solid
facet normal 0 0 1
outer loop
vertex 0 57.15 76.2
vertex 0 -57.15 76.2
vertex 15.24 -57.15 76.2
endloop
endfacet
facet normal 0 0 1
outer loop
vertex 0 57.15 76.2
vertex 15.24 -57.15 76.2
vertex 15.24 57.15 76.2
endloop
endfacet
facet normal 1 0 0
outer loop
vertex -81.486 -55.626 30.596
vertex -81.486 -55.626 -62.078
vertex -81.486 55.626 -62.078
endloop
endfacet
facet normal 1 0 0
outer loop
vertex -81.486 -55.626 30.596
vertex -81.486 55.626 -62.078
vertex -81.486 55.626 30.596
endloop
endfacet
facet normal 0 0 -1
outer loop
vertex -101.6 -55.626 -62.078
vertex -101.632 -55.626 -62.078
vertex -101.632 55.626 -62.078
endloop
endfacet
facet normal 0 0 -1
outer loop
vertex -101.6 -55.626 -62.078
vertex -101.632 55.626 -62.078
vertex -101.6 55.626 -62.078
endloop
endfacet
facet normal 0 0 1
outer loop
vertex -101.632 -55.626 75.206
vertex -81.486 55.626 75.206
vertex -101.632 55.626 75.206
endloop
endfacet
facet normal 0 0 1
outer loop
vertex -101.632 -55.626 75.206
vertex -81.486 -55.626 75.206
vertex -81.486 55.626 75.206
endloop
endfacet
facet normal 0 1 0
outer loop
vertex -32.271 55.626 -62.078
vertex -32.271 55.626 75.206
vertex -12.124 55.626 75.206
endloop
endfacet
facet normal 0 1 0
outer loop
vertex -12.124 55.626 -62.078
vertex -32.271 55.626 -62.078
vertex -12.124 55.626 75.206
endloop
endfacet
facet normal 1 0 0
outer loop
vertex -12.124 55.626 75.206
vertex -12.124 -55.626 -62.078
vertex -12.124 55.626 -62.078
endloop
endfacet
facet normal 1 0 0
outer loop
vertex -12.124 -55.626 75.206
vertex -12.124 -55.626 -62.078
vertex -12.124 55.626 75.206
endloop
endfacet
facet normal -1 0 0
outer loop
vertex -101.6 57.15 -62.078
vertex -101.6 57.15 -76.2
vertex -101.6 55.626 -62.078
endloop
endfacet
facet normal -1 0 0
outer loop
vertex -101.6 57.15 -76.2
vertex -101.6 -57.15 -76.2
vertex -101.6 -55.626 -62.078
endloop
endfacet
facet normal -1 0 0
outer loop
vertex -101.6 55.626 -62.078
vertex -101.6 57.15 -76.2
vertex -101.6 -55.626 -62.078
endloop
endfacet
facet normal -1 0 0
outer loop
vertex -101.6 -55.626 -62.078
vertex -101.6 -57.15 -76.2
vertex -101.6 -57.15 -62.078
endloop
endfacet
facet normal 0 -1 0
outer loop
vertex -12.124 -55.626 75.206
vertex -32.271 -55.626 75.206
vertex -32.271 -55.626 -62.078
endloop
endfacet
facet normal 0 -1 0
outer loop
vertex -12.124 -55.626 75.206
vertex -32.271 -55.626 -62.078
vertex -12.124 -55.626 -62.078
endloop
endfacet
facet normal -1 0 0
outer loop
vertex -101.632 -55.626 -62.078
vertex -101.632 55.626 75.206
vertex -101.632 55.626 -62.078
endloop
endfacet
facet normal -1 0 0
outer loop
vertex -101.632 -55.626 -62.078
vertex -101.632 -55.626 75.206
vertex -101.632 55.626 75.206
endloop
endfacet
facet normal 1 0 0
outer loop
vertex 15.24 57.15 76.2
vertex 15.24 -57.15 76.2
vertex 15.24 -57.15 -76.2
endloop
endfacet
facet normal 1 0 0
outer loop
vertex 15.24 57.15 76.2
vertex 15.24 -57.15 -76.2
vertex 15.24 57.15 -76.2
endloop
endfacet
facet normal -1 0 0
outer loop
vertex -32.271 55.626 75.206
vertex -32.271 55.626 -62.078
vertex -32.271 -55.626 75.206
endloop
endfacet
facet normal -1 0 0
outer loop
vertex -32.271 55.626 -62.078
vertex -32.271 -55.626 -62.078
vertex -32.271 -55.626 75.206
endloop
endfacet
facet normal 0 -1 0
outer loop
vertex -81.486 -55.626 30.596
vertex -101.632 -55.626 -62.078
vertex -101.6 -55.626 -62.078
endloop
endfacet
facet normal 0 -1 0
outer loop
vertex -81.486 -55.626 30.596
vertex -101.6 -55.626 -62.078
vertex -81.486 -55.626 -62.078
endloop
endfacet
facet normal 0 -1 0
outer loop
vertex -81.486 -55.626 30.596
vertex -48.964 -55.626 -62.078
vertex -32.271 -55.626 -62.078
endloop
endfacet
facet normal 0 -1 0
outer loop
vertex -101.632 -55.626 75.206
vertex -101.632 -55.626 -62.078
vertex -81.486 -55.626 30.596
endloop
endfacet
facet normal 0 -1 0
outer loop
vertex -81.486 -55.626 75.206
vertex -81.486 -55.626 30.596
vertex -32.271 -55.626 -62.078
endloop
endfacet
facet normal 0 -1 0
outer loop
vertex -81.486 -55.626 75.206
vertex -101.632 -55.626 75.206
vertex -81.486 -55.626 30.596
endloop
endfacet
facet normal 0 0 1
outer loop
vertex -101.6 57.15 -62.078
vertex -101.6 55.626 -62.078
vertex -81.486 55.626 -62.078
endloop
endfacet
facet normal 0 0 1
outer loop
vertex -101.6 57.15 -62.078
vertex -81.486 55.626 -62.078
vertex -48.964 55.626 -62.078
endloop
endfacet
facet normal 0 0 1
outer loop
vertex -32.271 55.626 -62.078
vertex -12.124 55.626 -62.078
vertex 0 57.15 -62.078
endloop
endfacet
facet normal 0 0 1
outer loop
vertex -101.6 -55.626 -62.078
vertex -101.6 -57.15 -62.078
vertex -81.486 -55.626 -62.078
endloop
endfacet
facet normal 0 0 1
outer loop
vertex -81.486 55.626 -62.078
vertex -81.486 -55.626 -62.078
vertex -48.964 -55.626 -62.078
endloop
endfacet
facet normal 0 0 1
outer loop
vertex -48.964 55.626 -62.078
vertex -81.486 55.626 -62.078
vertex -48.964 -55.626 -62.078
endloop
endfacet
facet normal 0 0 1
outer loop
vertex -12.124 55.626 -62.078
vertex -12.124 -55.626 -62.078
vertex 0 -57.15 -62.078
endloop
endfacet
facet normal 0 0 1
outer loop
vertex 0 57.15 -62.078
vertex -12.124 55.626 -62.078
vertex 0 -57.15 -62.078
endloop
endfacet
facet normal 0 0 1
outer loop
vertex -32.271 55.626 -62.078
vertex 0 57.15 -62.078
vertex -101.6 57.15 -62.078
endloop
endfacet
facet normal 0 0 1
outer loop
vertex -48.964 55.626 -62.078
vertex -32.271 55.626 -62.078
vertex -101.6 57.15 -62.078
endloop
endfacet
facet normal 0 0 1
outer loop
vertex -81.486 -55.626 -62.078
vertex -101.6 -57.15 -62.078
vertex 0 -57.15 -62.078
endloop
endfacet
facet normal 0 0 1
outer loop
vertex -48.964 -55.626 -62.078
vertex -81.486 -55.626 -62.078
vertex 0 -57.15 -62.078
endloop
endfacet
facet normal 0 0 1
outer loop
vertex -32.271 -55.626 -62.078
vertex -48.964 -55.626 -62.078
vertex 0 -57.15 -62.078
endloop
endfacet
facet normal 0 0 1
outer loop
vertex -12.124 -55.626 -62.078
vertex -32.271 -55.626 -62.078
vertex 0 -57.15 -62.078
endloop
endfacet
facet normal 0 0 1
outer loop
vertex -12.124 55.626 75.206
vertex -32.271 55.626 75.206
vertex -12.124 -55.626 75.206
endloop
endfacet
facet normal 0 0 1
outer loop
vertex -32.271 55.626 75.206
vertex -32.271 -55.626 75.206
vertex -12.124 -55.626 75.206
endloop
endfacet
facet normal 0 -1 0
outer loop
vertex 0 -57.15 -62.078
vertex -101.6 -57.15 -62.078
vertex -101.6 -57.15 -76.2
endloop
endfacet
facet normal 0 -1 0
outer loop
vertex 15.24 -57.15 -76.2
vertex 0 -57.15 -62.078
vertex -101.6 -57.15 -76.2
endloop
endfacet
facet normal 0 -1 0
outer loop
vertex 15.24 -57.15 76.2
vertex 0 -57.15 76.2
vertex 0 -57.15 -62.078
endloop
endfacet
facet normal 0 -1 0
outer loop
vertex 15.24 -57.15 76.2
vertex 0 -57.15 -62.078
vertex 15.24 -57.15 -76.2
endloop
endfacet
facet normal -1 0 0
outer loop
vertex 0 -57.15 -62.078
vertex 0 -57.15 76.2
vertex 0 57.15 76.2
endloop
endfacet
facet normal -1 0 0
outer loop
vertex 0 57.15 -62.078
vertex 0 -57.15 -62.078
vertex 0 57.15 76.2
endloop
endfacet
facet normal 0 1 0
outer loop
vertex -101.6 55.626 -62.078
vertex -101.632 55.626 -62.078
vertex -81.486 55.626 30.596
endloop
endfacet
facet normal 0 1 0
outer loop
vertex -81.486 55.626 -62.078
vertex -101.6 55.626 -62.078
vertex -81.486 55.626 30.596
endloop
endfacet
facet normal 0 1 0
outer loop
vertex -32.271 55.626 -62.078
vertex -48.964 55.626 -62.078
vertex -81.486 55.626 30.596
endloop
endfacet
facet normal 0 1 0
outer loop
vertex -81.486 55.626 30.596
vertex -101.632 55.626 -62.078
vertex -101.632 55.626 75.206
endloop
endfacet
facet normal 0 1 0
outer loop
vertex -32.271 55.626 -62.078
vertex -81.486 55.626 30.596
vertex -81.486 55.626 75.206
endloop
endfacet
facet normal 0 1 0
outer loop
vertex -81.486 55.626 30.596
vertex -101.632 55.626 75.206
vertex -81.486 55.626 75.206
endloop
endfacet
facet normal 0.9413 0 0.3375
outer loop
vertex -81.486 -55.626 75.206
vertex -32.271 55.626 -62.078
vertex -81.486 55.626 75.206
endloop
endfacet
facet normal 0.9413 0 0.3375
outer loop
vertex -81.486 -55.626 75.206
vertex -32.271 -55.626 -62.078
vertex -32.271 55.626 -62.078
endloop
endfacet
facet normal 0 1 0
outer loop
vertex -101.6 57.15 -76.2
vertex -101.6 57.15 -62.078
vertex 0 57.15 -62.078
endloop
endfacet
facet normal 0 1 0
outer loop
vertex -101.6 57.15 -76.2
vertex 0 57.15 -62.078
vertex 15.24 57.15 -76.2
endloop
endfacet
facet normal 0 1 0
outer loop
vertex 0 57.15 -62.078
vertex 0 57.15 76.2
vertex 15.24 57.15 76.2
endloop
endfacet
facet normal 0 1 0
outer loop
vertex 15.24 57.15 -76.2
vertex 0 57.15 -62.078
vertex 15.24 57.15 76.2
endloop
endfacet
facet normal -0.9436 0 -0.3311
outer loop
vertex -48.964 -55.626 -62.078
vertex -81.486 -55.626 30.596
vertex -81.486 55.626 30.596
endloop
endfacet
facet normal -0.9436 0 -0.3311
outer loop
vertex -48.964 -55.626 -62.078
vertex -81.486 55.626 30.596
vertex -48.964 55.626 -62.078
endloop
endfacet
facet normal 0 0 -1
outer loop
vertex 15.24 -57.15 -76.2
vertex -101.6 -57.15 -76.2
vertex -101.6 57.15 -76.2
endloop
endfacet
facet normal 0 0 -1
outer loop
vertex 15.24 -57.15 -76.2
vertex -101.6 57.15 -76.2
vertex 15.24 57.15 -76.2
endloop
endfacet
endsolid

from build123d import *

# Parameters (mm, degrees)
F0_W     = 114.3
F0_H     = 152.4
F1_DEPTH = 15.24
F2_W     = 101.6
F2_H     = 14.1224
F3_DEPTH = 57.15
F4_DEPTH = 57.15
F5_W     = 20.146407
F5_H     = 137.283351
F6_DEPTH = 55.626
F7_DEPTH = 55.626


with BuildPart() as f1:
    # F0 (on Right) → F1 (new body)
    with BuildSketch(Plane.YZ):
        Rectangle(F0_W, F0_H)
    extrude(amount=F1_DEPTH)

    # F2 (on Front) → F3 (join)
    with BuildSketch(Plane.XZ):
        with Locations((-50.8, -69.1388)):
            Rectangle(F2_W, F2_H)
    extrude(amount=F3_DEPTH)

    # F2 (on Front) → F4 (join)
    with BuildSketch(Plane.XZ):
        with Locations((-50.8, -69.1388)):
            Rectangle(F2_W, F2_H)
    extrude(amount=-F4_DEPTH)

    # F5 (on Front) → F6 (join)
    with BuildSketch(Plane.XZ):
        Polygon((-101.631984, 75.205751), (-101.631984, -62.0776), (-81.485577, -62.0776), (-81.485577, 30.595854), (-81.485577, 75.205751), align=None)
        with Locations((-22.197589, 6.564075)):
            Rectangle(F5_W, F5_H)
        Polygon((-81.485577, 75.205751), (-81.485577, 30.595854), (-48.963528, -62.0776), (-32.270793, -62.0776), align=None)
    extrude(amount=F6_DEPTH)

    # F5 (on Front) → F7 (join)
    with BuildSketch(Plane.XZ):
        Polygon((-101.631984, 75.205751), (-101.631984, -62.0776), (-81.485577, -62.0776), (-81.485577, 30.595854), (-81.485577, 75.205751), align=None)
        with Locations((-22.197589, 6.564075)):
            Rectangle(F5_W, F5_H)
        Polygon((-81.485577, 75.205751), (-81.485577, 30.595854), (-48.963528, -62.0776), (-32.270793, -62.0776), align=None)
    extrude(amount=-F7_DEPTH)


solid = f1.part
